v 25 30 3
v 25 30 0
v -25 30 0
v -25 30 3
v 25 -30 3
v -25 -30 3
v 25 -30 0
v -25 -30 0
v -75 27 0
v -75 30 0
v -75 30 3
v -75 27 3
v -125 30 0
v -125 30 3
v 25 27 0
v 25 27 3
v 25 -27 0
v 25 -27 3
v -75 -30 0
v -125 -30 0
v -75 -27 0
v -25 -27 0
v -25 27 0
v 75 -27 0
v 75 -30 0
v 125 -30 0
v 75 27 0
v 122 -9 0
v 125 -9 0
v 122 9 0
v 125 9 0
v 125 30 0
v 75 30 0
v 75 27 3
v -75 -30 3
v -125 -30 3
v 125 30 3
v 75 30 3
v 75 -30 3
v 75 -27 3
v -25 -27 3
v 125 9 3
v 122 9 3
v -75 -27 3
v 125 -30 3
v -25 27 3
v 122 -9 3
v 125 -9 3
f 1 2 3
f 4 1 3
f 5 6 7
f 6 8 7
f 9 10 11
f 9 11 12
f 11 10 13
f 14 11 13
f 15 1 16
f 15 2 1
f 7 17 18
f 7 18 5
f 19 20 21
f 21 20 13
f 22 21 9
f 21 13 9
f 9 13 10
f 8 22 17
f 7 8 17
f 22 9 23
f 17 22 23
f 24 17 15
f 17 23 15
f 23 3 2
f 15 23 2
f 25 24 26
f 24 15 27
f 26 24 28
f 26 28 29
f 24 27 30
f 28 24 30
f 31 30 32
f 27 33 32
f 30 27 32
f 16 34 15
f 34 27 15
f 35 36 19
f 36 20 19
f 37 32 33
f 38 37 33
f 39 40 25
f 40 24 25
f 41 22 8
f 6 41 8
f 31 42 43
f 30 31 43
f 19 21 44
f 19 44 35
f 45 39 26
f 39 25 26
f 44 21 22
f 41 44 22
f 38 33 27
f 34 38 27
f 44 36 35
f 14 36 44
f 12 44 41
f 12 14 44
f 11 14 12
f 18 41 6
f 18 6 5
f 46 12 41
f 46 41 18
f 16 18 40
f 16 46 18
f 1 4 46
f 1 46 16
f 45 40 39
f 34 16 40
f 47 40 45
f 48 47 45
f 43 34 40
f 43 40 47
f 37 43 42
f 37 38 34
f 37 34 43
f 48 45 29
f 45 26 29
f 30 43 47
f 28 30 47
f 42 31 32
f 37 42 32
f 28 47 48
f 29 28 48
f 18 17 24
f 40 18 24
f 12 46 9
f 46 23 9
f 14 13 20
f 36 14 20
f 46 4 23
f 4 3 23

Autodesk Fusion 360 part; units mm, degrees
sketch "Sketch1" plane through (0, 0, 0) normal (0, 0, 1) x (1, 0, 0) in component "Step front"
  line L0 (125, 30) -> (-125, 30)
  line L1 (-125, 30) -> (-125, -30)
  line L2 (-125, -30) -> (125, -30)
  line L3 (125, -30) -> (125, 30)
  line L4 (125, 30) -> (-125, -30) construction
  line L5 (-125, 30) -> (125, -30) construction
  line L6 (-125, 30) -> (-75, 30)
  line L7 (-75, 30) -> (-75, 27)
  line L8 (-75, 27) -> (-125, 27)
  line L9 (-125, 27) -> (-125, 30)
  line L10 (-25, 27) -> (-75, 27)
  line L11 (-25, 30) -> (-25, 27)
  line L12 (-75, 30) -> (-25, 30)
  line L13 (-75, 30) -> (-75, -30)
  line L14 (25, 27) -> (-25, 27)
  line L15 (25, 30) -> (25, 27)
  line L16 (-25, 30) -> (25, 30)
  line L17 (-25, 30) -> (-25, -30)
  line L18 (75, 27) -> (25, 27)
  line L19 (75, 30) -> (75, 27)
  line L20 (25, 30) -> (75, 30)
  line L21 (25, 30) -> (25, -30)
  line L22 (125, 27) -> (75, 27)
  line L23 (125, 30) -> (125, 27)
  line L24 (75, 30) -> (125, 30)
  line L25 (75, 30) -> (75, -30)
  line L26 (-75, -30) -> (-125, -30)
  line L27 (-75, -27) -> (-75, -30)
  line L28 (-125, -27) -> (-75, -27)
  line L29 (-125, -27) -> (-125, -30)
  line L30 (-25, -30) -> (-75, -30)
  line L31 (-25, -27) -> (-25, -30)
  line L32 (-75, -27) -> (-25, -27)
  line L33 (-75, -27) -> (-75, -30)
  line L34 (25, -30) -> (-25, -30)
  line L35 (25, -27) -> (25, -30)
  line L36 (-25, -27) -> (25, -27)
  line L37 (-25, -27) -> (-25, -30)
  line L38 (75, -30) -> (25, -30)
  line L39 (75, -27) -> (75, -30)
  line L40 (25, -27) -> (75, -27)
  line L41 (25, -27) -> (25, -30)
  line L42 (125, -30) -> (75, -30)
  line L43 (125, -27) -> (125, -30)
  line L44 (75, -27) -> (125, -27)
  line L45 (75, -27) -> (75, -30)
  dimension "d1" = 250
  dimension "d2" = 60
  dimension "d9" = 50
  dimension "d10" = 3
extrude "Extrude3" add sketch "Sketch1" along normal blind 3 contours L0 L3 L19 L22 L23 L24 L25 | L3 L22 L25 L44 | L0 L11 L14 L15 L16 L17 L21 | L18 L21 L25 L40 | L2 L3 L25 L39 L42 L43 L44 L45 | L14 L17 L21 L36 | L0 L1 L6 L7 L8 L9 L13 | L10 L13 L17 L32 | L2 L17 L21 L31 L34 L35 L36 L37 L41 | L1 L8 L13 L28 | L1 L2 L13 L26 L27 L28 L29 L33 in component "Step front"
sketch "Sketch3" plane through (0, 0, 3) normal (0, 0, 1) x (-1, 0, 0) in component "Step front"
  line L0 (-25, 27) -> (-75, 27)
  line L1 (-75, 27) -> (-75, 30)
  line L2 (-75, 30) -> (-125, 30)
  line L3 (-125, 30) -> (-125, -30)
  line L4 (-125, -30) -> (-75, -30)
  line L5 (-75, -30) -> (-75, -27)
  line L6 (-75, -27) -> (-25, -27)
  line L7 (-25, -27) -> (-25, -30)
  line L8 (-25, -30) -> (25, -30)
  line L9 (25, -30) -> (25, -27)
  line L10 (25, -27) -> (75, -27)
  line L11 (75, -27) -> (75, -30)
  line L12 (75, -30) -> (125, -30)
  line L13 (125, -30) -> (125, 30)
  line L14 (125, 30) -> (75, 30)
  line L15 (75, 30) -> (75, 27)
  line L16 (75, 27) -> (25, 27)
  line L17 (25, 27) -> (25, 30)
  line L18 (25, 30) -> (-25, 30)
  line L19 (-25, 30) -> (-25, 27)
  line L20 (-125, -30) -> (-122, -30) construction
  line L21 (-122, -30) -> (-122, -8) construction
  line L22 (-122, -8) -> (-125, -8) construction
  line L23 (-125, -8) -> (-125, -30) construction
  line L24 (-125, 30) -> (-122, 30) construction
  line L25 (-122, 30) -> (-122, 8) construction
  line L26 (-122, 8) -> (-125, 8) construction
  line L27 (-125, 8) -> (-125, 30) construction
  line L28 (-125, -9) -> (-122, -9)
  line L29 (-122, -9) -> (-122, 9)
  line L30 (-122, 9) -> (-125, 9)
  line L31 (-125, 9) -> (-125, -9)
  dimension "d17" = 22
  dimension "d18" = 3
  dimension "d19" = 22
extrude "Extrude4" cut sketch "Sketch3" against normal blind 12 contours L3 L28 L29 L30 L31 in component "Step front"
sketch "Sketch1 (2)" plane through (0, 0, 3) normal (0, 0, 1) x (-1, 0, 0)
  line L0 (-122, -9) -> (-125, -9)
  line L1 (-125, -9) -> (-125, -30)
  line L2 (-125, -30) -> (-75, -30)
  line L3 (-75, -30) -> (-75, -27)
  line L4 (-75, -27) -> (-25, -27)
  line L5 (-25, -27) -> (-25, -30)
  line L6 (-25, -30) -> (25, -30)
  line L7 (25, -30) -> (25, -27)
  line L8 (25, -27) -> (75, -27)
  line L9 (75, -27) -> (75, -30)
  line L10 (75, -30) -> (125, -30)
  line L11 (125, -30) -> (125, 30)
  line L12 (125, 30) -> (75, 30)
  line L13 (75, 30) -> (75, 27)
  line L14 (75, 27) -> (25, 27)
  line L15 (25, 27) -> (25, 30)
  line L16 (25, 30) -> (-25, 30)
  line L17 (-25, 30) -> (-25, 27)
  line L18 (-25, 27) -> (-75, 27)
  line L19 (-75, 27) -> (-75, 30)
  line L20 (-75, 30) -> (-125, 30)
  line L21 (-125, 30) -> (-125, 9)
  line L22 (-125, 9) -> (-122, 9)
  line L23 (-122, 9) -> (-122, -9)
component "Step front" placed x (1, 0, 0) y (0, 1, 0) z (0, 0, 1) at (0, 0, 0)
